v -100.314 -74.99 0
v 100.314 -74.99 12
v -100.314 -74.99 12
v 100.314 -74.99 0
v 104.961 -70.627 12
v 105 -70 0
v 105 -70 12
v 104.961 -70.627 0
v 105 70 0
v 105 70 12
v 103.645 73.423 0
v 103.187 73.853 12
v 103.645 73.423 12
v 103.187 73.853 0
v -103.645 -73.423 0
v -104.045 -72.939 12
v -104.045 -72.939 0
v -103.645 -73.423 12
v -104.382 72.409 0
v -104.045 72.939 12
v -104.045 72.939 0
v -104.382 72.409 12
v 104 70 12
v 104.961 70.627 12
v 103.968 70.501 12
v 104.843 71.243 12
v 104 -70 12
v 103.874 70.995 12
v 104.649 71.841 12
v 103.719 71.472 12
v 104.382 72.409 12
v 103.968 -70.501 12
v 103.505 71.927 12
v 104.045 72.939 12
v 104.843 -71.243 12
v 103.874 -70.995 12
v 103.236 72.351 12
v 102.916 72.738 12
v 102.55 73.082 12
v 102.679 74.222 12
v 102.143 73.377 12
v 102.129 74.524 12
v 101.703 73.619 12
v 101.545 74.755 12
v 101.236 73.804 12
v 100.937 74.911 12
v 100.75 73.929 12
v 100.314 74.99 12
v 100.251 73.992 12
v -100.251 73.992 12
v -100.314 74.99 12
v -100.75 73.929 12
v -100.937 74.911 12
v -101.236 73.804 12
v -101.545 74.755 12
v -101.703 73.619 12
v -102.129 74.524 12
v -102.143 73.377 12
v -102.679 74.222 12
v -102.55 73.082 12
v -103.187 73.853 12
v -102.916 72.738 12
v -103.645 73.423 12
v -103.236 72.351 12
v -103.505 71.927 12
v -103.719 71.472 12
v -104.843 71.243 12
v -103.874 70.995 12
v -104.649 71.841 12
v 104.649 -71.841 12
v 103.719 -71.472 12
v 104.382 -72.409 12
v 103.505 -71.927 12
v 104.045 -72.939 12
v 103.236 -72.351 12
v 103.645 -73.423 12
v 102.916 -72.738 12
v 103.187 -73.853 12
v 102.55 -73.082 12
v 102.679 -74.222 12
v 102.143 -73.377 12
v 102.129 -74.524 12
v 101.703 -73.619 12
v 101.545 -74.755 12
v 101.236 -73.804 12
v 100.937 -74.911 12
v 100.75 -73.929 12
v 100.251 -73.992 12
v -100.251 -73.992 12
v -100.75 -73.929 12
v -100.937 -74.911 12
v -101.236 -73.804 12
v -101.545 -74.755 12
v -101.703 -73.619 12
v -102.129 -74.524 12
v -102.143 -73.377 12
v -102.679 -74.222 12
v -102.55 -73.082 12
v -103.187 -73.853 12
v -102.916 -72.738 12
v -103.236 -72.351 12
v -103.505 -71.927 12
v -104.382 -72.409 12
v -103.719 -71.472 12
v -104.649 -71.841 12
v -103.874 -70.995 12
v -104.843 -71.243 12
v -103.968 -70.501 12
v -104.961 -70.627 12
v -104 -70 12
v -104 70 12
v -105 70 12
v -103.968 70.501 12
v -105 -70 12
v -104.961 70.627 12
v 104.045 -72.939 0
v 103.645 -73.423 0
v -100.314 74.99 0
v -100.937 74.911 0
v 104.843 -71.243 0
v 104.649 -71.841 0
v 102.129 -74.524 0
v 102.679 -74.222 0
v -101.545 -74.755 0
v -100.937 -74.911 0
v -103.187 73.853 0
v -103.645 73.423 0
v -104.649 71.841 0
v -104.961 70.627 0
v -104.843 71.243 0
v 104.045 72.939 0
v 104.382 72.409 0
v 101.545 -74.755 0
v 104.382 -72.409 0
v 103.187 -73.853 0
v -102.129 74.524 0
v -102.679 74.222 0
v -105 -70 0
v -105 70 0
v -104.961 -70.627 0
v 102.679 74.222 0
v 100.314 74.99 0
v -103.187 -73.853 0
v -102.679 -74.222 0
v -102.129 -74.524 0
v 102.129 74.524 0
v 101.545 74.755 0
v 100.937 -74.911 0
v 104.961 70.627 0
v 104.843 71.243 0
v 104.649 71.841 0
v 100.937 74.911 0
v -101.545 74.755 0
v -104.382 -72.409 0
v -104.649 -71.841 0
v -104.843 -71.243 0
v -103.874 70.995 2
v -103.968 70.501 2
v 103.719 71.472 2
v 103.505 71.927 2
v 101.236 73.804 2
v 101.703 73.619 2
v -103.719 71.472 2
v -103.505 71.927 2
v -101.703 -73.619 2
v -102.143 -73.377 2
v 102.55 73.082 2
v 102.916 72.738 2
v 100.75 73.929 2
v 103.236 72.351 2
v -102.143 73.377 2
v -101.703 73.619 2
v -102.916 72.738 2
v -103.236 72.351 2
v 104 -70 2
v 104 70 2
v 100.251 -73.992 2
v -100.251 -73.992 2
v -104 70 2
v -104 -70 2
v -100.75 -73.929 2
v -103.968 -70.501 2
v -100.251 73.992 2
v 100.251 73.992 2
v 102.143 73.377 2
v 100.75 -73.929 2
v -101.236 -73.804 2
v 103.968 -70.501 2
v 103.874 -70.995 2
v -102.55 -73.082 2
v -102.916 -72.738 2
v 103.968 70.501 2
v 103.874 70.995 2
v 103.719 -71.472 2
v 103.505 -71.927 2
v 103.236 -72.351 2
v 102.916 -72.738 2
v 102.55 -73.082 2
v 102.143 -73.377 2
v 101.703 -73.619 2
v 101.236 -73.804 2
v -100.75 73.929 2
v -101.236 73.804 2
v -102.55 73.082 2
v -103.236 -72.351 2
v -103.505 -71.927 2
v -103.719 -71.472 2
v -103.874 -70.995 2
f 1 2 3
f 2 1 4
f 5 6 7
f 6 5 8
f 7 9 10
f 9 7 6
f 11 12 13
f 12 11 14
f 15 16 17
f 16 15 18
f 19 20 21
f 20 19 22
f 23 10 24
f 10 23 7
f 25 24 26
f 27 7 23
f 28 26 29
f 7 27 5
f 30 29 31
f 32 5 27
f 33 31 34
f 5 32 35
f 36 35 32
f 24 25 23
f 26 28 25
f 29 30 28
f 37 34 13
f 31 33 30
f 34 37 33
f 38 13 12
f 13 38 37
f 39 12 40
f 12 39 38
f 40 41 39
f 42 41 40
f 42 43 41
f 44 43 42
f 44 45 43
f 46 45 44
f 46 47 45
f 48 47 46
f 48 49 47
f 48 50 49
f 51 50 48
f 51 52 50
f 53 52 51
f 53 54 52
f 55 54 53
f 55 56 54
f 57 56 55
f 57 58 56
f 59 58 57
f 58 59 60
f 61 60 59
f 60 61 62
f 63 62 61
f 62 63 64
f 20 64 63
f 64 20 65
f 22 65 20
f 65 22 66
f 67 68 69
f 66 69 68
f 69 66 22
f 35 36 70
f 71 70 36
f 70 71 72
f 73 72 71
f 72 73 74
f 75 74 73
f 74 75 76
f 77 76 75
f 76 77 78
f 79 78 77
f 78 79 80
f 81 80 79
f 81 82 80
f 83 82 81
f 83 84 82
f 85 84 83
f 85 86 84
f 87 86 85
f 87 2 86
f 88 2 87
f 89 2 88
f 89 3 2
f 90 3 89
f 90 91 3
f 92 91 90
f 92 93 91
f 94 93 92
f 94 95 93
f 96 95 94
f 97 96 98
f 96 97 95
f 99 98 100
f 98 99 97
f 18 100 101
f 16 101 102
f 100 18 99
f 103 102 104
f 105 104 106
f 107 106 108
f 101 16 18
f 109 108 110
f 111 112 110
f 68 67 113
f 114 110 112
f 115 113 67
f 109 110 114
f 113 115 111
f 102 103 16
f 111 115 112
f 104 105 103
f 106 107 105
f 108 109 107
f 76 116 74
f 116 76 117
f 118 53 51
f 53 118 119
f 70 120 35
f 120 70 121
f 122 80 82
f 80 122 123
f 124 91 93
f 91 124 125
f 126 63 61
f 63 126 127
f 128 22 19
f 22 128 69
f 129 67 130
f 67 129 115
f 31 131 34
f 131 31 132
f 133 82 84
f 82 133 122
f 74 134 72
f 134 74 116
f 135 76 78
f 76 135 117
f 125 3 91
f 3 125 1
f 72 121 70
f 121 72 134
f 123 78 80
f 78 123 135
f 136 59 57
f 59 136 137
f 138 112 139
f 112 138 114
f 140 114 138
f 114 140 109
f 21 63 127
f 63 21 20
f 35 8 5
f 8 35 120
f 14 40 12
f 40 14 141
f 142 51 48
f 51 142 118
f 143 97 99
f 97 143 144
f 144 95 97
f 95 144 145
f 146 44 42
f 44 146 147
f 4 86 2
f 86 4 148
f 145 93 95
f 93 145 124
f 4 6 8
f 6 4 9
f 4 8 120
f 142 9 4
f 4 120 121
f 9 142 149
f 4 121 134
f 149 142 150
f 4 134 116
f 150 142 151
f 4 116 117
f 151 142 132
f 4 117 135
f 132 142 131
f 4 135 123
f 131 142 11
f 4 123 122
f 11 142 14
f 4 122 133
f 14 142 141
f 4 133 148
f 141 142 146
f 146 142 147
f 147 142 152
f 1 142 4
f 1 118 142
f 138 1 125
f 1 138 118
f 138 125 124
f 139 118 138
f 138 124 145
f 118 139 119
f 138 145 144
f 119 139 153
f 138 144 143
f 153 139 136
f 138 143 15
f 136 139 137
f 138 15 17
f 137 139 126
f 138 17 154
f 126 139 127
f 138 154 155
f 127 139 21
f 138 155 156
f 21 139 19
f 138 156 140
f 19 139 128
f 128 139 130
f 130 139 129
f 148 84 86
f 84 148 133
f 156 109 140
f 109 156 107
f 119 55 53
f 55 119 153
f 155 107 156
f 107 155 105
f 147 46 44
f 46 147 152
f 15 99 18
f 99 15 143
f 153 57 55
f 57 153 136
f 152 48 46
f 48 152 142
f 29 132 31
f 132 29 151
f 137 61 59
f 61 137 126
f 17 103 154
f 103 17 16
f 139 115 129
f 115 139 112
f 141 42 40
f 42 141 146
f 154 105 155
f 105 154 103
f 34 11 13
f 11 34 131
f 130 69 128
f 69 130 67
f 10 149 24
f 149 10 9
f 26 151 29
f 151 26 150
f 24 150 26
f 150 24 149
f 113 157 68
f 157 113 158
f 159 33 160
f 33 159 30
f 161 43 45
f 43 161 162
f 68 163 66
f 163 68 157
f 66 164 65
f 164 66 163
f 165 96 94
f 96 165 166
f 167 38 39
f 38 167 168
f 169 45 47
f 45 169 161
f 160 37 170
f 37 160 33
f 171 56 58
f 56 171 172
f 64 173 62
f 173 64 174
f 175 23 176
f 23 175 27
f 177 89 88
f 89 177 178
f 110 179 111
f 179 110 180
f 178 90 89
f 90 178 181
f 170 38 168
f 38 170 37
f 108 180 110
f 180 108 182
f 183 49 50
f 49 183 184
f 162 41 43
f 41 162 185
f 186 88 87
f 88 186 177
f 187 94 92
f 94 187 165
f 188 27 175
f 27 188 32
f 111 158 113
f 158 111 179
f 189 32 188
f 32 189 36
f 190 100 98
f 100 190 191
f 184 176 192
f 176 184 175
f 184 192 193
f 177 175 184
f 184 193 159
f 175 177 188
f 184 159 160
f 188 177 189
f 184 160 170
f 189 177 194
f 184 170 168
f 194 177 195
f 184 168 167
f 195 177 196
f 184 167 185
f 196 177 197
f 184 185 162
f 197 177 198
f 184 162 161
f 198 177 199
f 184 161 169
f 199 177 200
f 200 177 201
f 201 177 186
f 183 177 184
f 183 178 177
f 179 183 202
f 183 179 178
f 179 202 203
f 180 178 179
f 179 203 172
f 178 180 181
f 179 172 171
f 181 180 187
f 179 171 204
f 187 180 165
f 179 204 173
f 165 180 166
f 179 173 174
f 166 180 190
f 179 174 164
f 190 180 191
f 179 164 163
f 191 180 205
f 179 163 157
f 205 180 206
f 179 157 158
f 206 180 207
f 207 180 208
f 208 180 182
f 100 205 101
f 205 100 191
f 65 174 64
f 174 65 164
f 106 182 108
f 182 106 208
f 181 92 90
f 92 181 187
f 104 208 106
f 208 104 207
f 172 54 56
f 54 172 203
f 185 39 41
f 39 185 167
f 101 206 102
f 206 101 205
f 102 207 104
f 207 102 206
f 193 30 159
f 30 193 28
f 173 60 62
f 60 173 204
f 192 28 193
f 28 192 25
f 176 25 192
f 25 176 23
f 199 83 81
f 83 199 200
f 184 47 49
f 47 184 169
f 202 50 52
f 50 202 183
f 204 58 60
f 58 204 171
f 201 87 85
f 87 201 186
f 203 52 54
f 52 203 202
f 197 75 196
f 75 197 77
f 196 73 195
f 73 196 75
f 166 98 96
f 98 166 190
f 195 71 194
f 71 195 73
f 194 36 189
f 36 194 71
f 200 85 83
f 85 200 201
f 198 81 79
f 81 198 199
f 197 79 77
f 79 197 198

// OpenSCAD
$fn = 50;


difference() {
	union() {
		hull() {
			translate(v = [-100.0000000000, 70.0000000000, 0]) {
				cylinder(h = 12, r = 5);
			}
			translate(v = [100.0000000000, 70.0000000000, 0]) {
				cylinder(h = 12, r = 5);
			}
			translate(v = [-100.0000000000, -70.0000000000, 0]) {
				cylinder(h = 12, r = 5);
			}
			translate(v = [100.0000000000, -70.0000000000, 0]) {
				cylinder(h = 12, r = 5);
			}
		}
	}
	union() {
		translate(v = [0, 0, 2]) {
			hull() {
				translate(v = [-100.0000000000, 70.0000000000, 0]) {
					cylinder(h = 10, r = 4);
				}
				translate(v = [100.0000000000, 70.0000000000, 0]) {
					cylinder(h = 10, r = 4);
				}
				translate(v = [-100.0000000000, -70.0000000000, 0]) {
					cylinder(h = 10, r = 4);
				}
				translate(v = [100.0000000000, -70.0000000000, 0]) {
					cylinder(h = 10, r = 4);
				}
			}
		}
	}
}
